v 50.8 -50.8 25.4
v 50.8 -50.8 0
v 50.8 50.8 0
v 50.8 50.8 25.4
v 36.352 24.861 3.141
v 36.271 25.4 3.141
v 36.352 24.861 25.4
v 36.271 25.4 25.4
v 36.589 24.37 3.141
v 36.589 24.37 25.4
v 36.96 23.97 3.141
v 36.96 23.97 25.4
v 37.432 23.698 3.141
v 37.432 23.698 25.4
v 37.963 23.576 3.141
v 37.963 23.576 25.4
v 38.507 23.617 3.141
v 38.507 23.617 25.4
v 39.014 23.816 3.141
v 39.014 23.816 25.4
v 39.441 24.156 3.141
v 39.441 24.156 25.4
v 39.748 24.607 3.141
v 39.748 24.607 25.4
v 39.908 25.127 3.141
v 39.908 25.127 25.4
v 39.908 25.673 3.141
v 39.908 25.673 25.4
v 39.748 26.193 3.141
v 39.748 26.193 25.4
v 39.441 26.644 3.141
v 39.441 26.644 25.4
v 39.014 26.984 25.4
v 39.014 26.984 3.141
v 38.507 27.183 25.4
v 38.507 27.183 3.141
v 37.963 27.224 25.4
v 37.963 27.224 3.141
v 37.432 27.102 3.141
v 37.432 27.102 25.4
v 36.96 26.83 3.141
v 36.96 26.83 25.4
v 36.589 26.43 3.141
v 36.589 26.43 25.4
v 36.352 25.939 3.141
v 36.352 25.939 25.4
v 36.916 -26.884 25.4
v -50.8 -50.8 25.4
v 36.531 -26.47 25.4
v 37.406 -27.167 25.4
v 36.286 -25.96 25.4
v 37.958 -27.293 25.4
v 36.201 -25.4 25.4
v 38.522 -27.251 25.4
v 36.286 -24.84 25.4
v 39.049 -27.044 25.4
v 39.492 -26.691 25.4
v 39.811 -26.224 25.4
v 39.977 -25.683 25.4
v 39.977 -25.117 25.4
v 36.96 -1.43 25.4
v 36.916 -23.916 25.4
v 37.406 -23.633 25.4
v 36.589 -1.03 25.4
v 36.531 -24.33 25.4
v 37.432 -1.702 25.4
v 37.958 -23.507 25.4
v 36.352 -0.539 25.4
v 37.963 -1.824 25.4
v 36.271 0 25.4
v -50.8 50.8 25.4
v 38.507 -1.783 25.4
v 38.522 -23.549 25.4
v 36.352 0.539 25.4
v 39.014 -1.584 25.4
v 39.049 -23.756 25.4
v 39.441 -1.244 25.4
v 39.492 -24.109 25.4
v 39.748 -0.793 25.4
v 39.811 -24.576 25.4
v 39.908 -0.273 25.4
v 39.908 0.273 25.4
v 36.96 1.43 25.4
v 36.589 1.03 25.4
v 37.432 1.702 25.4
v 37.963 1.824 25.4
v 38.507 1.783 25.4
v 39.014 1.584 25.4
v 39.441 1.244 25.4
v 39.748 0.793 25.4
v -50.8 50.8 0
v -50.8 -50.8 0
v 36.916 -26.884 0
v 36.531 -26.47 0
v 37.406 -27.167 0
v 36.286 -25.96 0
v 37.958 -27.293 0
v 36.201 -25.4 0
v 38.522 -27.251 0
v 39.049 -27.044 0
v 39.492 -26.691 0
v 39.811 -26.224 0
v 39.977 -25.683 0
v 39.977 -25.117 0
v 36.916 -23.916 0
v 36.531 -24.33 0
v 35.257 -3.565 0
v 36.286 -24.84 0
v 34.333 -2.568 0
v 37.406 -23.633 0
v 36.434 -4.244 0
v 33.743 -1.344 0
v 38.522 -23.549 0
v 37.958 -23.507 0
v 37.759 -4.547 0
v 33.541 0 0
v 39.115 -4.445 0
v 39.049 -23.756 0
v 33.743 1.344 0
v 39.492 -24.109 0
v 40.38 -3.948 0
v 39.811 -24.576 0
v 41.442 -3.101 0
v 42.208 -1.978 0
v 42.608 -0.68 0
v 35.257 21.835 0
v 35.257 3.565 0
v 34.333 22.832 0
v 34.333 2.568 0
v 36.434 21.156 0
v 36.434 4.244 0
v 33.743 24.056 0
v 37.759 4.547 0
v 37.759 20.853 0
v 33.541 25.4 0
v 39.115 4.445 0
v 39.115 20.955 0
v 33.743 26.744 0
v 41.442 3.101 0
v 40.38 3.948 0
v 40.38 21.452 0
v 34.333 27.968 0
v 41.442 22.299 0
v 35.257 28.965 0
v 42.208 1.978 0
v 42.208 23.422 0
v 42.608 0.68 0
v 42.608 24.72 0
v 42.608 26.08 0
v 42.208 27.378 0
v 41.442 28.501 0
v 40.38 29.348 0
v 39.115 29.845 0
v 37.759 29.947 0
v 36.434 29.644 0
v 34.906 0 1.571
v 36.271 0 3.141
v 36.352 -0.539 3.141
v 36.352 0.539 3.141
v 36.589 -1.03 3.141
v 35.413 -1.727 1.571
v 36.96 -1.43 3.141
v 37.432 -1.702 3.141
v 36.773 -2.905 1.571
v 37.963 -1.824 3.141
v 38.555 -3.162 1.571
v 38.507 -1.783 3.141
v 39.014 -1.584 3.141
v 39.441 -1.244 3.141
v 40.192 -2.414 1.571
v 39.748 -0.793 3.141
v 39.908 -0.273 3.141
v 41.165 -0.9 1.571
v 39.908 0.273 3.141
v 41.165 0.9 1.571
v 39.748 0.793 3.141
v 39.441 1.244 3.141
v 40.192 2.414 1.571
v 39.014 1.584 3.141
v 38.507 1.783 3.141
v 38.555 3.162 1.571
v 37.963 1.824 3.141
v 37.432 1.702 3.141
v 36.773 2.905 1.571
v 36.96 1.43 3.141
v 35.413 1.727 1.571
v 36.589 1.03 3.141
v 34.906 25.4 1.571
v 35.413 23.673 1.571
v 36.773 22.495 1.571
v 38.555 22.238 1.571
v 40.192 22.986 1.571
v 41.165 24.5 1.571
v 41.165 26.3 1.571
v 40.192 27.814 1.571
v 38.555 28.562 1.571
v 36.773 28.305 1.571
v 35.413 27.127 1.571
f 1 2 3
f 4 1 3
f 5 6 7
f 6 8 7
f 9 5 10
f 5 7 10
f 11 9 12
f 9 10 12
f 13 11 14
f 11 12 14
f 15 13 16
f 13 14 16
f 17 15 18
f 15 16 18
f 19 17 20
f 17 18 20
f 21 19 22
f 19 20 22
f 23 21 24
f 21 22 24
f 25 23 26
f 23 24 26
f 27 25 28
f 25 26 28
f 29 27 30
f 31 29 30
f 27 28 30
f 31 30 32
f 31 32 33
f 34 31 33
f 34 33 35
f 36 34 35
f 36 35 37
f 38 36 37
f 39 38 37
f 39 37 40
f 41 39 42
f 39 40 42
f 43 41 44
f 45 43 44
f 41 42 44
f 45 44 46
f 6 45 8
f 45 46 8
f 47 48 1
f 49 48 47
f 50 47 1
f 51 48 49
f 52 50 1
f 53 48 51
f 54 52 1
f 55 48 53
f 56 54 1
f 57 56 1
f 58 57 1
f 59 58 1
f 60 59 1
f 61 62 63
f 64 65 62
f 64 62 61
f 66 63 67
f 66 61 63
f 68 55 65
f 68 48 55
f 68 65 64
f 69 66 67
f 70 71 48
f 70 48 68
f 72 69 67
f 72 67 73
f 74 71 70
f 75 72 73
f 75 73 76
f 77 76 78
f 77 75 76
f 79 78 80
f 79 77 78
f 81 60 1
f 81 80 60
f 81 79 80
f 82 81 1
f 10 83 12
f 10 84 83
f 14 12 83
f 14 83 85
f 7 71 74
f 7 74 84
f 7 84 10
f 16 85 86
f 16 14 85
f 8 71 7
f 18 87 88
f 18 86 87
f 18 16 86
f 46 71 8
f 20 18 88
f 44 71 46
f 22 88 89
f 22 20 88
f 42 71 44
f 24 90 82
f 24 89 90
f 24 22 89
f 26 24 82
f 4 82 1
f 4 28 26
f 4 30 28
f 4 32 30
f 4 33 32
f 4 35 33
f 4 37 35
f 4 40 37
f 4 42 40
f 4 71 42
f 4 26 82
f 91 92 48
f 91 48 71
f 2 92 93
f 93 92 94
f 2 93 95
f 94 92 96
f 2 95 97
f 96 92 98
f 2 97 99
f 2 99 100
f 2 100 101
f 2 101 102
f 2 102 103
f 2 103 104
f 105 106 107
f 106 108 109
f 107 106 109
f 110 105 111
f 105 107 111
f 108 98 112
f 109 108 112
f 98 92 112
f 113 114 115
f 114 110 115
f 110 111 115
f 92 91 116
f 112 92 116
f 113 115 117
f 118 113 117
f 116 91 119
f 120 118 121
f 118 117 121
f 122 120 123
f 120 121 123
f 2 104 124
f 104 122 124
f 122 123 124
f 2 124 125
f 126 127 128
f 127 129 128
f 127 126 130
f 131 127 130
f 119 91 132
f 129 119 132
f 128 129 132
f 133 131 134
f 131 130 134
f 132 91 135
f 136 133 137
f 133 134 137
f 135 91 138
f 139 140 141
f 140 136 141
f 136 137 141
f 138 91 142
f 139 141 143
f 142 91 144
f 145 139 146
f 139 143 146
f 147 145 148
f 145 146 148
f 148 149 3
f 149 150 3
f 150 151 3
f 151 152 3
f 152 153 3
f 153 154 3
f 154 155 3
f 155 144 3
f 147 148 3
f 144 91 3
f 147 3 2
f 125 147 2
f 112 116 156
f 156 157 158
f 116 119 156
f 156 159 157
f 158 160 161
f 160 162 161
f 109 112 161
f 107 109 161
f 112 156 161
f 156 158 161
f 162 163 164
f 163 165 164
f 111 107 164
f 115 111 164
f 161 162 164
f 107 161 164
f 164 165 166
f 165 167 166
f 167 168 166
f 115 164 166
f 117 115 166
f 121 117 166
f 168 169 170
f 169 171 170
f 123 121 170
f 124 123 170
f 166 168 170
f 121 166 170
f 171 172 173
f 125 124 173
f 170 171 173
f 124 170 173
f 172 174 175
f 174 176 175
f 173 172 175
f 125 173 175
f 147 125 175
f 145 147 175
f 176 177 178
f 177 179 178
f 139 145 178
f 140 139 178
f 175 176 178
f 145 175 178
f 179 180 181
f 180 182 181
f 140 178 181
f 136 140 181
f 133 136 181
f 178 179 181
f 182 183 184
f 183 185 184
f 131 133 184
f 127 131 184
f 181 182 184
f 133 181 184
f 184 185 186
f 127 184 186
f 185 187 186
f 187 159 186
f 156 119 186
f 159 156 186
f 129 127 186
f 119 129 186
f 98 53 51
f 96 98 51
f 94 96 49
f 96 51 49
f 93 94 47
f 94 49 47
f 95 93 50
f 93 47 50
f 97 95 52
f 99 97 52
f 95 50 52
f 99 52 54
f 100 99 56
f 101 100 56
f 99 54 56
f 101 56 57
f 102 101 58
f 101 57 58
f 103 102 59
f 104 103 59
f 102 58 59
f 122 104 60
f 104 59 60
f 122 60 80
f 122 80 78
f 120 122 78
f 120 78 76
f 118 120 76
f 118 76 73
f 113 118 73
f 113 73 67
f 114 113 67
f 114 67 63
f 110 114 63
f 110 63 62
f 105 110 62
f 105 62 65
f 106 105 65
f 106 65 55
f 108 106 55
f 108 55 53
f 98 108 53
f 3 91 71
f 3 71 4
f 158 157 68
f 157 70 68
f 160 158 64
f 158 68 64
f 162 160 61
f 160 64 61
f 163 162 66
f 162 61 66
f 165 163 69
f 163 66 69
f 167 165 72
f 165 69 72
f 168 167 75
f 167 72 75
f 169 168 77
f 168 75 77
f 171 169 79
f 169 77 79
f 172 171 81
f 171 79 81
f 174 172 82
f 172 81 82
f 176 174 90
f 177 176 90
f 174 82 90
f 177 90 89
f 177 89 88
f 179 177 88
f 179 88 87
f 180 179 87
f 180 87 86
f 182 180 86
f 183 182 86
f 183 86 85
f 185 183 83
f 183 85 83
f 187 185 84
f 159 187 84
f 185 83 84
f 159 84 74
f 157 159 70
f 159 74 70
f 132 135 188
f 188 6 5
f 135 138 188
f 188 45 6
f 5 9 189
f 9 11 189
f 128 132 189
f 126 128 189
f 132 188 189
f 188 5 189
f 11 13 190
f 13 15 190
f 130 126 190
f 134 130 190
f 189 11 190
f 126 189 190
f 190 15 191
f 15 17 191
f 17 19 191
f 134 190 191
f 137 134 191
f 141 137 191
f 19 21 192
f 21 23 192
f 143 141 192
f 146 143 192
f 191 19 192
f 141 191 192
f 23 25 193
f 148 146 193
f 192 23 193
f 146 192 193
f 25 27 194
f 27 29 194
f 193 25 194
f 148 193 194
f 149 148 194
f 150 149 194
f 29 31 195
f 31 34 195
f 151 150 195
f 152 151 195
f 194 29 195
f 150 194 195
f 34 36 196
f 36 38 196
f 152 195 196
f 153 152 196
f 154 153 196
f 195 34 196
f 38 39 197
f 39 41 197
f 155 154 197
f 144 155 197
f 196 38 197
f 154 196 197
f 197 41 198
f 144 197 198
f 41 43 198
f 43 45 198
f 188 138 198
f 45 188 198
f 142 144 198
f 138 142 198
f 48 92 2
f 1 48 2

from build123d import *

# Parameters (mm, degrees)
F0_W           = 101.6
F0_H           = 101.6
F1_DEPTH       = 25.4
F2_D           = 3.7973
F3_D           = 3.6576
F3_CSINK_D     = 9.1186
F3_CSINK_ANGLE = 82


with BuildPart() as f1:
    # F0 (on Top) → F1 (new body)
    with BuildSketch(Plane.XY):
        Rectangle(F0_W, F0_H)
    extrude(amount=F1_DEPTH)

    # F2 (through all)
    with Locations(Plane(origin=(0, 0, 0), x_dir=(1, 0, 0), z_dir=(0, 0, -1))):
        with Locations((38.1, 25.4)):
            Hole(F2_D / 2)

    # F3 (through all)
    with Locations(Plane(origin=(0, 0, 0), x_dir=(1, 0, 0), z_dir=(0, 0, -1))):
        with Locations((38.1, 0), (38.1, -25.4)):
            CounterSinkHole(F3_D / 2, F3_CSINK_D / 2, counter_sink_angle=F3_CSINK_ANGLE)


solid = f1.part
